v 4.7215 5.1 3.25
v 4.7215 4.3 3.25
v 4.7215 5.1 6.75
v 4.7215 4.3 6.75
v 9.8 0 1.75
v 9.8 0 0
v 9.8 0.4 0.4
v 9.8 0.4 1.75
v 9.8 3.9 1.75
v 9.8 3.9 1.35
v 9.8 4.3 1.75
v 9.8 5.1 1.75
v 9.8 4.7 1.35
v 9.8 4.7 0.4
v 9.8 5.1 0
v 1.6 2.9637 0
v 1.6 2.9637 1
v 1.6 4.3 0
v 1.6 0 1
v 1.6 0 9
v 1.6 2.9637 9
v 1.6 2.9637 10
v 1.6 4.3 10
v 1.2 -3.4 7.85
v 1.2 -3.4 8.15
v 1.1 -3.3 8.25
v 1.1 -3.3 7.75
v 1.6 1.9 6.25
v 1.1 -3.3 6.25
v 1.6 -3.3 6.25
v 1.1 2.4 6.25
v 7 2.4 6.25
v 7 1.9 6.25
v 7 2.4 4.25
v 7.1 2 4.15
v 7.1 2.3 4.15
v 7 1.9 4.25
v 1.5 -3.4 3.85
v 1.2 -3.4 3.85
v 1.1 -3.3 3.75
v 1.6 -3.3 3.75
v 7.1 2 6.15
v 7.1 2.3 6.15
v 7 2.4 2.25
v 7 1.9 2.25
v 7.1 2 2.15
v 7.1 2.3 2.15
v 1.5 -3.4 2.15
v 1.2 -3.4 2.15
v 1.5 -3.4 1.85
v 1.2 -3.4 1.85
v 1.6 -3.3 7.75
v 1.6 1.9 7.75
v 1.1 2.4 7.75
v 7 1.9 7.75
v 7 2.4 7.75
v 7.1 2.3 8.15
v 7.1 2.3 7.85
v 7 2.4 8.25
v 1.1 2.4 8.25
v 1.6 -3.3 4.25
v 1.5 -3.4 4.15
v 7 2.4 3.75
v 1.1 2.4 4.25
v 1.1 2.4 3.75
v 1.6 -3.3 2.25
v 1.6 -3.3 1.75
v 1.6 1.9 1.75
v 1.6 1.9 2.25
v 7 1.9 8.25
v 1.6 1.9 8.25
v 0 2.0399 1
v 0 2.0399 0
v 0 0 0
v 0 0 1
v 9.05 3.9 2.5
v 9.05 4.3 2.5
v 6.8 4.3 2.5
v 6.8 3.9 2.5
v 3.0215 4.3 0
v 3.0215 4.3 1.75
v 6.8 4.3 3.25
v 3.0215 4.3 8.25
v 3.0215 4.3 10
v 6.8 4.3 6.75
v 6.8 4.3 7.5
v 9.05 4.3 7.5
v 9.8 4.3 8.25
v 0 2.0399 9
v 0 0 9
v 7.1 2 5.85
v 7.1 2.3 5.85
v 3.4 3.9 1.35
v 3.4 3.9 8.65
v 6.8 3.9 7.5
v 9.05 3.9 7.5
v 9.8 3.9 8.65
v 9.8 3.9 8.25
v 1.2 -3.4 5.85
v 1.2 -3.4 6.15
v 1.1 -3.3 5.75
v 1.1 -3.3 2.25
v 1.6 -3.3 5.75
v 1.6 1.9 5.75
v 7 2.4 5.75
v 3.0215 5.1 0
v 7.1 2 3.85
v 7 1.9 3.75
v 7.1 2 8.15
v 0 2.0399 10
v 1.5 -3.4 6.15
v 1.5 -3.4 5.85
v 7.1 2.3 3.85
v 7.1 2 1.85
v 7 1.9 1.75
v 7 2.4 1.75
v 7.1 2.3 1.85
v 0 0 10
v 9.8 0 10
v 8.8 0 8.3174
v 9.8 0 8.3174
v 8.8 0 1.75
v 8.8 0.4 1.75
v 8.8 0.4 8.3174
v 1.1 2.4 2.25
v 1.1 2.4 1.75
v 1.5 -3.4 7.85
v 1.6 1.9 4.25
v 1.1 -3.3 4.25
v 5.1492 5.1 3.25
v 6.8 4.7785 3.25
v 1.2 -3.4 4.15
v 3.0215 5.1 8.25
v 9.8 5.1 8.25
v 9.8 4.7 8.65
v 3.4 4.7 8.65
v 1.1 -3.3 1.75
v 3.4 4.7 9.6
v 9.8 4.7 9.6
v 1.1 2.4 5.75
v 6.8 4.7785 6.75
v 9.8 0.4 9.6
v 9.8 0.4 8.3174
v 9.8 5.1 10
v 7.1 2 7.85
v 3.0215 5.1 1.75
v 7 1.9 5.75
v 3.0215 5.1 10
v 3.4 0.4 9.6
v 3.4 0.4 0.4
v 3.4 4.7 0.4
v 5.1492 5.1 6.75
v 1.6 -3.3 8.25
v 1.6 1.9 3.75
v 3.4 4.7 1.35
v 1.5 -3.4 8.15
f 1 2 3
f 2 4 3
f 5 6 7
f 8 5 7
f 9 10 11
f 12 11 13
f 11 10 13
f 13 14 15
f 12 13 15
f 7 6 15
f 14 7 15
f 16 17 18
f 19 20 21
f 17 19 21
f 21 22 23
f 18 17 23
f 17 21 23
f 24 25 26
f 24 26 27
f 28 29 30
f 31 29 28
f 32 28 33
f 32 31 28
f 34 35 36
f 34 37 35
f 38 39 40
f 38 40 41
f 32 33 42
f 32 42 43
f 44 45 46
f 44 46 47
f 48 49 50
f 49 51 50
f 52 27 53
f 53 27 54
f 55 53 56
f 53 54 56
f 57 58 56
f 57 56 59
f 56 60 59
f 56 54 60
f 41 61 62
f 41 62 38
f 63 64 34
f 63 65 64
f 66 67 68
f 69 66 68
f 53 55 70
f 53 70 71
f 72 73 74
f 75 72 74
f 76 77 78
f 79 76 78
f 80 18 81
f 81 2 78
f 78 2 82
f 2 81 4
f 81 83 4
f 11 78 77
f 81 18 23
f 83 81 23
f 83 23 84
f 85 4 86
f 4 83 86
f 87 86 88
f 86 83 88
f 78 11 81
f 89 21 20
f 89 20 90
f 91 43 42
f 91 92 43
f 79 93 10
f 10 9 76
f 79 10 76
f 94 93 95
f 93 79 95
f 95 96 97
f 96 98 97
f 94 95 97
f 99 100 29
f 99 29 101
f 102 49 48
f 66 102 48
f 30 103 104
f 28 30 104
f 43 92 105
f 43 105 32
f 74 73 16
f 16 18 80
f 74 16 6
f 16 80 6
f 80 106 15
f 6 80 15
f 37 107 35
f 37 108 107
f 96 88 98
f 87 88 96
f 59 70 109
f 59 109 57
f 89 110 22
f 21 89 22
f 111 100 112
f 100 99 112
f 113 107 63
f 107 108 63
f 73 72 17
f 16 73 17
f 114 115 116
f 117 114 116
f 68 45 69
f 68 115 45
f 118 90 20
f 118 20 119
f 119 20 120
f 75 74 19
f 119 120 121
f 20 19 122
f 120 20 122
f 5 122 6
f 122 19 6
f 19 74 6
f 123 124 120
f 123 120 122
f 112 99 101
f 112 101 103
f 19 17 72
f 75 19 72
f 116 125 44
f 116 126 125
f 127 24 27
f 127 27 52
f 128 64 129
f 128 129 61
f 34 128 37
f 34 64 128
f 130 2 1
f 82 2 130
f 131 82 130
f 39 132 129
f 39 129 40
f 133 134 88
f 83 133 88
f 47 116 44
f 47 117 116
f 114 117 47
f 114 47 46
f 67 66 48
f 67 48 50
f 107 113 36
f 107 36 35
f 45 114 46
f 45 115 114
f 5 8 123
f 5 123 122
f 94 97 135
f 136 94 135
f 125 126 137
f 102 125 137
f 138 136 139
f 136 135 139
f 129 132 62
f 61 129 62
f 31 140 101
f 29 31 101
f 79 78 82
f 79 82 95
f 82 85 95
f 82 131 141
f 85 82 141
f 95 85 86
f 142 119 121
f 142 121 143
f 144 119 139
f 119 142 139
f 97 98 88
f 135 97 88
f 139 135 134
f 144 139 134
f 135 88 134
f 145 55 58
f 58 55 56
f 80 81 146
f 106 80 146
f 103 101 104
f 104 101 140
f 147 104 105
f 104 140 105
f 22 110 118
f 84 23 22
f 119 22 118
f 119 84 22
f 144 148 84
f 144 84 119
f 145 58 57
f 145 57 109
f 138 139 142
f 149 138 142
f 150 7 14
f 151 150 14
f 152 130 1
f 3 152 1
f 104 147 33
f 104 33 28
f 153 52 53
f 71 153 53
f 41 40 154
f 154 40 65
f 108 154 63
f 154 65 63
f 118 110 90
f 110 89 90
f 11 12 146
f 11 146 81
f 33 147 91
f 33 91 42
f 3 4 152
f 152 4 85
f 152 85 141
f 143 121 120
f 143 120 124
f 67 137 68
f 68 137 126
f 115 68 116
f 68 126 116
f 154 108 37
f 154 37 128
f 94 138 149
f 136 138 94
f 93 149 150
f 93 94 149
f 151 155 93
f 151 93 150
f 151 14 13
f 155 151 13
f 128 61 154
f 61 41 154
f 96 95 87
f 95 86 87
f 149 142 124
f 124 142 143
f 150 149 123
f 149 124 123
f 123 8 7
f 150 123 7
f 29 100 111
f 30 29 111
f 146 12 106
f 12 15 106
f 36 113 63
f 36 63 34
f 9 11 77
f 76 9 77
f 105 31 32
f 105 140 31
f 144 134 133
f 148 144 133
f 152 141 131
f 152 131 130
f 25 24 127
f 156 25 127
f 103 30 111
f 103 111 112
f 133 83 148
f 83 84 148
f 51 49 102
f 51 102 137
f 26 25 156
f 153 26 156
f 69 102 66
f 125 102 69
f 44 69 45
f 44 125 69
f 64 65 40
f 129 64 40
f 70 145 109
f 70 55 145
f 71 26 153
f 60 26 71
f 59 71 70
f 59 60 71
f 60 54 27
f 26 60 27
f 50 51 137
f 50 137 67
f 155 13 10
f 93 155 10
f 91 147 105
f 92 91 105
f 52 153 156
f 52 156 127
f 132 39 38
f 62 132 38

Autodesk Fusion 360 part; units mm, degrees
sketch "Sketch1" plane through (0, 0, 0) normal (0, 0, 1) x (1, 0, 0)
  line L0 (0, 0) -> (9.8, 0)
  line L1 (9.8, 0) -> (9.8, 5.1)
  line L2 (9.8, 5.1) -> (0, 5.1)
  line L3 (0, 5.1) -> (0, 0)
  dimension "d1" = 9.8
  dimension "d2" = 5.1
extrude "Extrude1" add sketch "Sketch1" along normal blind 10 makes body 1
sketch "Sketch2" plane through (0, 5.1, 0) normal (0, 1, 0) x (-1, 0, 0)
  line L0 (-9.8, 0) -> (0, 0)
  line L1 (0, 0) -> (0, 10)
  line L2 (0, 10) -> (-9.8, 10)
  line L3 (-9.8, 10) -> (-9.8, 0)
  line L4 (0, 5) -> (-9.8, 5) construction
  line L5 (-1.6, 5) -> (-1.6, 1)
  line L6 (-1.6, 1) -> (0, 1)
  line L7 (0, 9) -> (0, 1)
  line L8 (-1.6, 9) -> (0, 9)
  line L9 (-1.6, 5) -> (-1.6, 9)
  dimension "d5" = 8.2
extrude "Extrude2" cut sketch "Sketch2" against normal through all contours L1 L5 L6 L7 L8 L9 bodies 1
sketch "Sketch3" plane through (9.8, 0, 0) normal (1, 0, 0) x (0, 0, -1)
  line L0 (0, 0) -> (0, 5.1)
  line L1 (0, 5.1) -> (-10, 5.1)
  line L2 (-10, 5.1) -> (-10, 0)
  line L3 (-10, 0) -> (0, 0)
  line L4 (-5, 5.1) -> (-5, 0) construction
  line L5 (-5, 5.1) -> (-3.25, 5.1) construction
  line L6 (-5, 0) -> (-1.75, 0) construction
  line L7 (-3.25, 5.1) -> (-1.75, 5.1)
  line L8 (-1.75, 5.1) -> (-1.75, 4.3)
  line L9 (-1.75, 4.3) -> (-3.25, 4.3)
  line L10 (-3.25, 4.3) -> (-3.25, 5.1)
  line L11 (-6.75, 4.3) -> (-6.75, 5.1)
  line L12 (-8.25, 4.3) -> (-6.75, 4.3)
  line L13 (-6.75, 5.1) -> (-8.25, 5.1)
  line L14 (-8.25, 5.1) -> (-8.25, 4.3)
  dimension "d7" = 1.75
  dimension "d8" = 3.25
  dimension "d9" = 4.3
extrude "Extrude3" cut sketch "Sketch3" against normal through all contours L1 L7 L8 L9 L10 | L1 L11 L12 L13 L14 bodies 1
sketch "Sketch4" plane through (0, 0, 10) normal (0, 0, 1) x (1, 0, 0)
  line L0 (0, 5.1) -> (0, 0)
  line L1 (0, 0) -> (9.8, 0)
  line L2 (9.8, 0) -> (9.8, 5.1)
  line L3 (9.8, 5.1) -> (0, 5.1)
  line L4 (0, 2.0399) -> (1.6, 2.9637)
  line L5 (1.6, 2.9637) -> (1.6, 4.3)
  line L6 (1.6, 4.3) -> (3.0215, 4.3)
  line L7 (3.0215, 4.3) -> (3.0215, 5.1)
  line L8 (0, 5.1) -> (3.0215, 5.1)
  line L9 (0, 5.1) -> (0, 2.0399)
  line L10 (1.6, 5.1) -> (1.6, 0)
  dimension "d11" = 4.3
  dimension "d12" = 8.2
  dimension "d13" = 60
extrude "Extrude4" cut sketch "Sketch4" against normal through all contours L0 L3 L4 L5 L8 L9 L10 | L3 L6 L7 L8 L10 bodies 1
sketch "Sketch5" plane through (0, 5.1, 0) normal (0, 1, 0) x (-1, 0, 0)
  line L0 (-3.0215, 3.25) -> (-3.0215, 6.75)
  line L1 (-3.0215, 6.75) -> (-9.8, 6.75)
  line L2 (-9.8, 6.75) -> (-9.8, 3.25)
  line L3 (-9.8, 3.25) -> (-3.0215, 3.25)
  line L4 (-9.05, 2.5) -> (-6.8, 2.5)
  line L5 (-6.8, 2.5) -> (-6.8, 7.5)
  line L6 (-6.8, 7.5) -> (-9.05, 7.5)
  line L7 (-9.8, 7.5) -> (-9.8, 2.5)
  line L8 (-9.8, 1.75) -> (-9.8, 3.25)
  line L9 (-9.8, 1.75) -> (-9.05, 2.5)
  line L10 (-9.8, 1.75) -> (-8.7393, 1.75) construction
  line L11 (-9.8, 2.5) -> (-9.8, 1.75)
  line L12 (-9.8, 7.5) -> (-9.8, 8.25)
  line L13 (-9.8, 8.25) -> (-9.05, 7.5)
  point P0 (-9.8, 8.25)
  dimension "d15" = 0.75
  dimension "d16" = 0.75
  dimension "d17" = 3
  dimension "d18" = 45
  dimension "d19" = 45
sketch "Sketch6" plane through (9.8, 0, 0) normal (1, 0, 0) x (0, 0, -1)
  line L0 (-8.25, 4.3) -> (-8.25, 5.1)
  line L1 (-8.25, 5.1) -> (-10, 5.1)
  line L2 (-10, 5.1) -> (-10, 0)
  line L3 (-10, 0) -> (0, 0)
  line L4 (0, 0) -> (0, 5.1)
  line L5 (0, 5.1) -> (-1.75, 5.1)
  line L6 (-1.75, 5.1) -> (-1.75, 4.3)
  line L7 (-1.75, 4.3) -> (-3.25, 4.3)
  line L8 (-3.25, 4.3) -> (-3.25, 5.1)
  line L9 (-3.25, 5.1) -> (-6.75, 5.1)
  line L10 (-6.75, 5.1) -> (-6.75, 4.3)
  line L11 (-6.75, 4.3) -> (-8.25, 4.3)
  line L12 (-9.6, 0.4) -> (-0.4, 0.4)
  line L13 (-0.4, 0.4) -> (-0.4, 4.7)
  line L14 (-0.4, 4.7) -> (-1.35, 4.7)
  line L15 (-1.35, 4.7) -> (-1.35, 3.9)
  line L16 (-1.35, 3.9) -> (-3.65, 3.9)
  line L17 (-3.65, 3.9) -> (-3.65, 4.7) construction
  line L18 (-3.65, 4.7) -> (-6.35, 4.7) construction
  line L19 (-6.35, 4.7) -> (-6.35, 3.9) construction
  line L20 (-6.35, 3.9) -> (-8.65, 3.9)
  line L21 (-8.65, 3.9) -> (-8.65, 4.7)
  line L22 (-8.65, 4.7) -> (-9.6, 4.7)
  line L23 (-9.6, 4.7) -> (-9.6, 0.4)
  line L24 (-6.35, 3.9) -> (-3.65, 3.9)
  dimension "d20" = 0.4
extrude "Extrude5" cut sketch "Sketch6" against normal blind 6.4 contours L12 L13 L14 L15 L16 L20 L21 L22 L23 L24 bodies 1
extrude "Extrude6" cut sketch "Sketch5" against normal up to surface (1.2 mm away) contours L3 L4 L5 L7 L8 L9 L11 | L1 L2 L3 L5 L7 | L1 L5 L6 L7 L12 L13 bodies 1
extrude "Extrude7" cut 1 faces at (3.0215, 4.5667, 5.5833) along direction (1, 0, 0) blind 1.7 on bodies 1 bodies 1
sketch "Sketch8" plane through (0, 0, 6.75) normal (0, 0, 1) x (1, 0, 0)
  line L0 (4.7215, 5.1) -> (4.7215, 4.3)
  line L1 (4.7215, 4.3) -> (6.8, 4.3)
  line L2 (6.8, 4.3) -> (6.8, 5.1)
  line L3 (6.8, 5.1) -> (4.7215, 5.1)
  line L4 (6.8, 4.7785) -> (5.1492, 5.1)
  line L5 (6.8, 5.1) -> (5.1492, 5.1)
  line L6 (6.8, 4.7785) -> (6.8, 5.1)
extrude "Extrude8" cut sketch "Sketch8" against normal up to surface (3.5 mm away) contours L2 L3 L4 L5 L6 bodies 1
sketch "Sketch9" plane through (9.8, 0, 0) normal (1, 0, 0) x (0, 0, -1)
  line L0 (-1.75, 4.3) -> (-1.75, 3.9)
  line L1 (-1.75, 3.9) -> (-1.35, 3.9)
  line L2 (-1.35, 3.9) -> (-1.35, 4.7)
  line L3 (-1.35, 4.7) -> (-0.4, 4.7)
  line L4 (-0.4, 4.7) -> (-0.4, 0.4)
  line L5 (-0.4, 0.4) -> (-9.6, 0.4)
  line L6 (-9.6, 0.4) -> (-9.6, 4.7)
  line L7 (-9.6, 4.7) -> (-8.65, 4.7)
  line L8 (-8.65, 4.7) -> (-8.65, 3.9)
  line L9 (-8.65, 3.9) -> (-8.25, 3.9)
  line L10 (-8.25, 3.9) -> (-8.25, 4.3)
  line L11 (-8.25, 4.3) -> (-8.25, 5.1)
  line L12 (-8.25, 5.1) -> (-10, 5.1)
  line L13 (-10, 5.1) -> (-10, 0)
  line L14 (-10, 0) -> (0, 0)
  line L15 (0, 0) -> (0, 5.1)
  line L16 (0, 5.1) -> (-1.75, 5.1)
  line L17 (-1.75, 5.1) -> (-1.75, 4.3)
  line L18 (-8.3174, 0.4) -> (-1.75, 0.4)
  line L19 (-1.75, 0.4) -> (-1.75, 0)
  line L20 (-1.75, 0) -> (-8.3174, 0)
  line L21 (-8.3174, 0) -> (-8.3174, 0.4)
extrude "Extrude9" cut sketch "Sketch9" against normal blind 1 contours L5 L14 L18 L19 L20 L21 bodies 1
ref_plane "WorkPlane1" through (4.9, 2.55, 5) normal (0, 0, 1) x (1, 0, 0)
ref_plane "WorkPlane2" through (4.9, 2.55, 2) normal (0, 0, 1) x (1, 0, 0)
sketch "Sketch10" plane through (4.9, 2.55, 2) normal (0, 0, 1) x (1, 0, 0)
  line L0 (4.9, 2.15) -> (4.9, -2.15)
  line L1 (-1.5, 2.15) -> (-1.5, -2.15)
  line L2 (4.9, 0) -> (0.8, 0) construction
  line L3 (1.1, -2.5) -> (1.7485, -2.5)
  line L4 (-3.3, -0.15) -> (-3.8, -0.15)
  line L5 (-3.8, -0.15) -> (-3.8, -5.95)
  line L6 (-3.8, -5.95) -> (-3.3, -5.95)
  line L7 (-3.3, -5.95) -> (-3.3, -0.65)
  line L8 (-3.3, 1.75) -> (-3.3, 0.4137)
  line L9 (-3.3, -0.15) -> (2.2, -0.15)
  line L10 (2.2, -0.15) -> (2.2, -0.65)
  line L11 (2.2, -0.65) -> (-3.3, -0.65)
  line L12 (-4.9, -2.55) -> (4.9, -2.55)
  dimension "d33" = 0.5
  dimension "d34" = 0.5
  dimension "d35" = 3.4
  dimension "d40" = 1.9
  dimension "d41" = 5.5
copy_body "Body->Comp1" bodies 1 removing the originals makes body 2 in component "housing"
extrude "Extrude1'" add sketch "Sketch10" along normal mid plane 0.5 separate body makes body 3 in component "Component"
chamfer "Chamfer1" distance 0.1 angle 45 4 edges at (7.1, 2.4, 2) (7.1, 2.15, 2.25) (7.1, 1.9, 2) (7.1, 2.15, 1.75) on bodies 3 in component "Component"
chamfer "Chamfer2" distance 0.1 angle 45 4 edges at (1.35, -3.4, 2.25) (1.6, -3.4, 2) (1.35, -3.4, 1.75) (1.1, -3.4, 2) on bodies 3 in component "Component"
pattern_linear "R-Pattern1" count 4 spacing 2 along (0, 0, 1) of bodies 3 makes body 4 at (3.2333, 2.2333, 3.75) makes body 5 at (3.2333, 2.2333, 5.75) makes body 6 at (3.2333, 2.2333, 7.75) in component "Component"
component "housing" placed x (1, 0, 0) y (0, 1, 0) z (0, 0, 1) at (0, 0, 0)
component "Component" placed x (1, 0, 0) y (0, 1, 0) z (0, 0, 1) at (0, 0, 0)
equation "d7 = ( 3.5 / 2 ) * 1 mm"
equation "d8 = 3 mm + ( ( 0.5 / 2 ) * 1 mm )"
equation "d40 = 2.15 mm - 0.25 mm"
